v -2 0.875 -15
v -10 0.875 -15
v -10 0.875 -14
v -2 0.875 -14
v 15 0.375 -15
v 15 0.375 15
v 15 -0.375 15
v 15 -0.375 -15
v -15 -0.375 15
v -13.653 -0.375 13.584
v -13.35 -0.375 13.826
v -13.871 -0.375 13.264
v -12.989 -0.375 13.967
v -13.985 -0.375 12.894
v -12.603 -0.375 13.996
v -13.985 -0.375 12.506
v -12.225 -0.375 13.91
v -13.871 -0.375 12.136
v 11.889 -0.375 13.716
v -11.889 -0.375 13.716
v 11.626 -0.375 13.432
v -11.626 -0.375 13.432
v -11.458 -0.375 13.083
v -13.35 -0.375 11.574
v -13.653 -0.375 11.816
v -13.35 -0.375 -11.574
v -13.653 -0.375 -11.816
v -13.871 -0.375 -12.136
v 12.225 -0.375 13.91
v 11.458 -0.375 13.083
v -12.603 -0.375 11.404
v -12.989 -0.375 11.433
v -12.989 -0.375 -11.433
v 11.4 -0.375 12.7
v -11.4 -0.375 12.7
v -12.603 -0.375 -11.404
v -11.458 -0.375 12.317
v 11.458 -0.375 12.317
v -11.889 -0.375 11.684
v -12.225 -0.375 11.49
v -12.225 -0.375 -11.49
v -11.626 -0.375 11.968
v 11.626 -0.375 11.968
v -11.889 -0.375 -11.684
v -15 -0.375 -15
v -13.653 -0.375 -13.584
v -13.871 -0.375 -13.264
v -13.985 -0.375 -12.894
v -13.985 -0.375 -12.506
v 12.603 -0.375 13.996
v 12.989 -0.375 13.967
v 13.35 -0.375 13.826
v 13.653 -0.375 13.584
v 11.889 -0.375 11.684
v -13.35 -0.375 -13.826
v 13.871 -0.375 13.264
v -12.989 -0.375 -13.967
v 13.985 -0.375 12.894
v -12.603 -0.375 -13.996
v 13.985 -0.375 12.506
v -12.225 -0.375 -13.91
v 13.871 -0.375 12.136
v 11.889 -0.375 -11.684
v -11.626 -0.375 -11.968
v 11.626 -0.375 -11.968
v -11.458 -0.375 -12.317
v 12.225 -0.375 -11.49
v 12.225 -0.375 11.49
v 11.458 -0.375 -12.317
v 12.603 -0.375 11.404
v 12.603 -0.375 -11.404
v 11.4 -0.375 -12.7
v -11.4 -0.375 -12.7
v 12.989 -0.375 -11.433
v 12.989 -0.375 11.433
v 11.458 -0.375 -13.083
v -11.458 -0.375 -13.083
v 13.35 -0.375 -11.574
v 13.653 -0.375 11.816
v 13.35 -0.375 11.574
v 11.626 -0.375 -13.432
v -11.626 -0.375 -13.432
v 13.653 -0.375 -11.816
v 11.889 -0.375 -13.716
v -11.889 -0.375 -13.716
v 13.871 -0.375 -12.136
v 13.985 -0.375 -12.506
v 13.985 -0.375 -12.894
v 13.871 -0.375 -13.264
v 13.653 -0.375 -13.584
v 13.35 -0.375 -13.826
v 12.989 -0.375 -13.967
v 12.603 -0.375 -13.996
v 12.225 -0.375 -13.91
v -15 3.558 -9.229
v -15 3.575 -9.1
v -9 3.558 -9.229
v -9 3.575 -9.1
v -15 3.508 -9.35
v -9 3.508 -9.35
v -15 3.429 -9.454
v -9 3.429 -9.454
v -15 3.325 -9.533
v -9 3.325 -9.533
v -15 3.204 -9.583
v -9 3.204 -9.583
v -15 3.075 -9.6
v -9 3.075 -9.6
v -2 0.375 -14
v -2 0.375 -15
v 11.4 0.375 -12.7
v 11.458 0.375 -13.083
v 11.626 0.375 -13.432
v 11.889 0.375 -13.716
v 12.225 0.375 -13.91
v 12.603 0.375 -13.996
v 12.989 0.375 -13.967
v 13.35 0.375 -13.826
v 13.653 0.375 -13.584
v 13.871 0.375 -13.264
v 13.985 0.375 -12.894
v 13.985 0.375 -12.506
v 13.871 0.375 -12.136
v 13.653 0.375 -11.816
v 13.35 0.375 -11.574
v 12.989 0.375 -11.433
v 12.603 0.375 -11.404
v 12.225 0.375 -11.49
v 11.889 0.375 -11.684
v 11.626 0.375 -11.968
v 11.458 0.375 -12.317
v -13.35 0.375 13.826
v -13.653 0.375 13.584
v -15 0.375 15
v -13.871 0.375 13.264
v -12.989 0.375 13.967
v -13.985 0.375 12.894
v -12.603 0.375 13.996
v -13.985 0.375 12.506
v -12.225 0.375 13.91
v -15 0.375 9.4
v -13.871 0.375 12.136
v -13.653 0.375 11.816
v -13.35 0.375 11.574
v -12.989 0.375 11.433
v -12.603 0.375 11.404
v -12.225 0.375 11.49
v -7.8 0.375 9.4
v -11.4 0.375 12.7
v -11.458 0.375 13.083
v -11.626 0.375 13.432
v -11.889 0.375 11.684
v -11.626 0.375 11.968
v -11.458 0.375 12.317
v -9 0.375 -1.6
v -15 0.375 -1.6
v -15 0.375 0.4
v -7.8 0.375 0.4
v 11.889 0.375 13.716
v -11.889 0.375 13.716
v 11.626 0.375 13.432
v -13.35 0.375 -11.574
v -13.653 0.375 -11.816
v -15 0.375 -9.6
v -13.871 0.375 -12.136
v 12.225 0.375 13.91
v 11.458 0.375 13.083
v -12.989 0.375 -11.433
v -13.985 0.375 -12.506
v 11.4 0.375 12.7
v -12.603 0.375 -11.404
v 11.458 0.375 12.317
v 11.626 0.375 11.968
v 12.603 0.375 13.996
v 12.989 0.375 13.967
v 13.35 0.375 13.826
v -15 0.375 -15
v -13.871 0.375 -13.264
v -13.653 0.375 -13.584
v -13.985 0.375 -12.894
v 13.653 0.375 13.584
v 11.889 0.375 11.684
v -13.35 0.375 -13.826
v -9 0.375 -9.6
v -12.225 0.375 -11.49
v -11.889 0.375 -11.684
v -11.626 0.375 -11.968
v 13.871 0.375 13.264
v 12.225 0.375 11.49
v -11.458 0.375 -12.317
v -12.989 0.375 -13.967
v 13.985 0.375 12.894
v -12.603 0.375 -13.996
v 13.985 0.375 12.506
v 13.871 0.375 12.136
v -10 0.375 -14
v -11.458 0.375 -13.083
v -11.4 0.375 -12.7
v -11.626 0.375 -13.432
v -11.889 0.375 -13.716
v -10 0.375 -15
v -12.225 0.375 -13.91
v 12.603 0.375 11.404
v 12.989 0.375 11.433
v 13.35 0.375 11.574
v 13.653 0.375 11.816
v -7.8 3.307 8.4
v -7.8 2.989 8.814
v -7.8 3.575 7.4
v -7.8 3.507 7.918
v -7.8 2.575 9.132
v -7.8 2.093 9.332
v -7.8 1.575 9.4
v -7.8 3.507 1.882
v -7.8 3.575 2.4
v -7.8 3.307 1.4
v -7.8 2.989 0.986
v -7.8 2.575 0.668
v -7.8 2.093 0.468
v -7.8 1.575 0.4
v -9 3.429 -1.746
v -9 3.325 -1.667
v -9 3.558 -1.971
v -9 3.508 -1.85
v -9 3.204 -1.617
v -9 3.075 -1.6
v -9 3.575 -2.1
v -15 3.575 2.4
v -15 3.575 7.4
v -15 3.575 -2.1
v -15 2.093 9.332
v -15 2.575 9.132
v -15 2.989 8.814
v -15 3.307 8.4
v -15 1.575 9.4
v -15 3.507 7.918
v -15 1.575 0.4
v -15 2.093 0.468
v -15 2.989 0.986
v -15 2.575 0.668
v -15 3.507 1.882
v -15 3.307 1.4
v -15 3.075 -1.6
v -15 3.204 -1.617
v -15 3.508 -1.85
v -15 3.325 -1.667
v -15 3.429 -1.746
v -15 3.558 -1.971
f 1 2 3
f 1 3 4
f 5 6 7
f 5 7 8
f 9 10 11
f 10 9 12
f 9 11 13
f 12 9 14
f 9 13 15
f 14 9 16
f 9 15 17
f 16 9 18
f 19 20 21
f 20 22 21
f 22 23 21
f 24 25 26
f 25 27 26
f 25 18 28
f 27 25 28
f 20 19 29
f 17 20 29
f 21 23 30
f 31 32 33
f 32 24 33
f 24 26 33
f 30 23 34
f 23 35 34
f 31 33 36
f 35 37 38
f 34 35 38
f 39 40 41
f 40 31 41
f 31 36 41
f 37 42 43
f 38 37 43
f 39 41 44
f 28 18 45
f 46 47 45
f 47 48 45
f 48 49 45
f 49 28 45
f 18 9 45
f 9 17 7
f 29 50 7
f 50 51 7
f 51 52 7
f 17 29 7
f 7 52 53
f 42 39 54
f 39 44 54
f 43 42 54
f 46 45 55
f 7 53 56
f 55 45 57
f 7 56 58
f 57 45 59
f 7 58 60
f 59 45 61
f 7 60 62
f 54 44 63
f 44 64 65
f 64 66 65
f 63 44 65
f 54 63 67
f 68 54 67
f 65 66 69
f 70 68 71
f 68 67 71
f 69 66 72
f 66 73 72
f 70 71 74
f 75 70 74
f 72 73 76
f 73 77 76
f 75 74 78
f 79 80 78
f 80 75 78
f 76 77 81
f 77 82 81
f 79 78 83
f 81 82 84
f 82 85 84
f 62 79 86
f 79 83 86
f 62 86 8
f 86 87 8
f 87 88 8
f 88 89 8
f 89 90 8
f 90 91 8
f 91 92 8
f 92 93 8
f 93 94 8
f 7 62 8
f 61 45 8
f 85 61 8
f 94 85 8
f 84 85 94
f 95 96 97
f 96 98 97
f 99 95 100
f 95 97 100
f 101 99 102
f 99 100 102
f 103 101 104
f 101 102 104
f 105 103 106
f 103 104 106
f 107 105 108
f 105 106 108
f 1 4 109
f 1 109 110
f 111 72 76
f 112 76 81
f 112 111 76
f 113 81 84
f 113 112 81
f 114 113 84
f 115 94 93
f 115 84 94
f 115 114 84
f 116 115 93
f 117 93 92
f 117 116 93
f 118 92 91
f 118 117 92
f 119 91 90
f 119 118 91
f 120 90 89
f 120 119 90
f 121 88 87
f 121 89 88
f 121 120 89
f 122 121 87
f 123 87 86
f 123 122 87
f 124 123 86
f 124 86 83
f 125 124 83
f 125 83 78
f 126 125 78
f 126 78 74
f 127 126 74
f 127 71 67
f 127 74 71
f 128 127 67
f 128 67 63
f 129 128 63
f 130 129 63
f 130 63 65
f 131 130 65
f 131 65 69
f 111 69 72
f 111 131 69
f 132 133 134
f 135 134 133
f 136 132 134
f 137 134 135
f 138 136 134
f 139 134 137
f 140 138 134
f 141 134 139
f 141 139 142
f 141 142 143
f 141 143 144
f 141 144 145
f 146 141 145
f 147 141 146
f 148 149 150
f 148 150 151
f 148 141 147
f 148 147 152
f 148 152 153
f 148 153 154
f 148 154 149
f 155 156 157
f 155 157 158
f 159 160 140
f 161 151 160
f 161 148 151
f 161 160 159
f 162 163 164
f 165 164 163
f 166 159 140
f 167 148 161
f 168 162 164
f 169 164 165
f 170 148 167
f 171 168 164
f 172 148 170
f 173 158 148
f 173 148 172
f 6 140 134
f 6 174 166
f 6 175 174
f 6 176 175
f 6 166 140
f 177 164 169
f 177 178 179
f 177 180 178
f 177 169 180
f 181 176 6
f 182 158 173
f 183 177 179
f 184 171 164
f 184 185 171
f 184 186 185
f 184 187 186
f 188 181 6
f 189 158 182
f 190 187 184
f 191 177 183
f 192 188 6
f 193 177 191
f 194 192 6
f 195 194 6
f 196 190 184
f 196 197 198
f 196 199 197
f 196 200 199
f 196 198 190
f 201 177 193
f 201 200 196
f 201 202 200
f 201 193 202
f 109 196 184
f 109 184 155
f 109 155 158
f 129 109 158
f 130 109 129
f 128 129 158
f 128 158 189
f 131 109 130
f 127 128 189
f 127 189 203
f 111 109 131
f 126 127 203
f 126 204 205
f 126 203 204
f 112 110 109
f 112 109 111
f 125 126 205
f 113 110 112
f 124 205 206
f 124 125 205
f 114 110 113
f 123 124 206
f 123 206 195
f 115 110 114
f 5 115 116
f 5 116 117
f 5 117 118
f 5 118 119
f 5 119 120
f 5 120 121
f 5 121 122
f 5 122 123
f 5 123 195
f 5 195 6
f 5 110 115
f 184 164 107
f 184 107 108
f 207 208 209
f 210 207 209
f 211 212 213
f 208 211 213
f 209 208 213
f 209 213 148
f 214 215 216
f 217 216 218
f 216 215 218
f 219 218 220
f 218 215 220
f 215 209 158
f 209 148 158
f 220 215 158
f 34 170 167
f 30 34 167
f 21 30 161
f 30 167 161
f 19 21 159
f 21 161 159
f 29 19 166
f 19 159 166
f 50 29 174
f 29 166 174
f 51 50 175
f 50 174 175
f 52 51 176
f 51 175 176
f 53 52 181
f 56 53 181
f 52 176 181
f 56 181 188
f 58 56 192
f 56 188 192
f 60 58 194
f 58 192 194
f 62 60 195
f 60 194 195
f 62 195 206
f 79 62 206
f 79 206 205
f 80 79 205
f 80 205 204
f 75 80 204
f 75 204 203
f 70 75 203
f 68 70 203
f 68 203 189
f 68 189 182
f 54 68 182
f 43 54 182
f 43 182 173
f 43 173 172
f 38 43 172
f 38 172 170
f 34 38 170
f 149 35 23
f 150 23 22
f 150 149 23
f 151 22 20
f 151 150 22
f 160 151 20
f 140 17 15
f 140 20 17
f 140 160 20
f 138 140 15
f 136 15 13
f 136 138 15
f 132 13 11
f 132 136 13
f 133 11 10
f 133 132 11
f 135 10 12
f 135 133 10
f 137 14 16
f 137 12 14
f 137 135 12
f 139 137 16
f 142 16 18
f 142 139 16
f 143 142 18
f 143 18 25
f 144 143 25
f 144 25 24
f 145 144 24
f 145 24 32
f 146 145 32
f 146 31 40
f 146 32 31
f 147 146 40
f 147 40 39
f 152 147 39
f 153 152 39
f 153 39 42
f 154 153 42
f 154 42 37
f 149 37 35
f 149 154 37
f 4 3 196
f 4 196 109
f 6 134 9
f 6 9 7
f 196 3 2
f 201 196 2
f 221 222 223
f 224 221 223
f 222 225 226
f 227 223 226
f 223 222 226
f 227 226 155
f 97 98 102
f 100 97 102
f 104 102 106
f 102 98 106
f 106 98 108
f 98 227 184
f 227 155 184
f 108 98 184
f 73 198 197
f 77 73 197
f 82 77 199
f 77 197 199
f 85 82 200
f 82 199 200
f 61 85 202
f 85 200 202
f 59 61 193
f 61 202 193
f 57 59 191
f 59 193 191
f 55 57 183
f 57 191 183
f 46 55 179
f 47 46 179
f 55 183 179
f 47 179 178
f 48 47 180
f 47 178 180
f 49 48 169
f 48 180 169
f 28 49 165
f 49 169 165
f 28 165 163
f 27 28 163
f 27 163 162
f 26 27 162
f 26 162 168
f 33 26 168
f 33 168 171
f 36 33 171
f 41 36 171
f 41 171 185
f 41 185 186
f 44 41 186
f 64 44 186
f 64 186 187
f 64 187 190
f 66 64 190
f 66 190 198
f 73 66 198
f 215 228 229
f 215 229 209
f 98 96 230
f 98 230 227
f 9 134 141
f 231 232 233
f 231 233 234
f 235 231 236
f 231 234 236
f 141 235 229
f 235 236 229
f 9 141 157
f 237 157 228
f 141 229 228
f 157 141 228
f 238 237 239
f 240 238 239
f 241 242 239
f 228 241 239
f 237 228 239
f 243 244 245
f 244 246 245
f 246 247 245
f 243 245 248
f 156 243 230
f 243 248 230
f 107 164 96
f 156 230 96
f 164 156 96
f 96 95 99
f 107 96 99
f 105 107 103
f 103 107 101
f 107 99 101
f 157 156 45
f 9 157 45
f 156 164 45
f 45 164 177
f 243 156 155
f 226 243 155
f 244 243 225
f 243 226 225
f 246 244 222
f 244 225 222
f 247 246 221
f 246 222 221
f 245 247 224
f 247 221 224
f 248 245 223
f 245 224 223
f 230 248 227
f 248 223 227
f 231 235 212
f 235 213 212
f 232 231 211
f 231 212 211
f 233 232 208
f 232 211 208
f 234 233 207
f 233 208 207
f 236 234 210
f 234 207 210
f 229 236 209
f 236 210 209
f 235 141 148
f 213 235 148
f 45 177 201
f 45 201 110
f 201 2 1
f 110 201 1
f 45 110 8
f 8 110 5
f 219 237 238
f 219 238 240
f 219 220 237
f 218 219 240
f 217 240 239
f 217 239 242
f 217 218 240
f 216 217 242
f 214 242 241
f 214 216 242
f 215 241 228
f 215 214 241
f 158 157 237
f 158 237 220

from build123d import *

# Parameters (mm, degrees)
SKETCH1_W               = 30
SKETCH1_H               = 30
BOSS_EXTRUDE1_DEPTH     = 0.375
SKETCH2_R               = 1.3
CUT_EXTRUDE1_DEPTH      = 1.75
MIRROR2_COPY_1_SKETCH_R = 1.3
MIRROR2_COPY_1_DEPTH    = 1.75
SKETCH3_W               = 7.2
SKETCH3_H               = 9
SKETCH3_W_2             = 6
SKETCH3_H_2             = 8
BOSS_EXTRUDE2_DEPTH     = 3.2
FILLET1_R               = 2
FILLET2_R               = 0.5
SKETCH4_W               = 8
SKETCH4_H               = 1
BOSS_EXTRUDE3_DEPTH     = 0.5


with BuildPart() as part:
    # Sketch1 → Boss-Extrude1 (new body, symmetric)
    with BuildSketch(Plane(origin=(0, 0, 0), x_dir=(1, 0, 0), z_dir=(0, 1, 0))):
        Rectangle(SKETCH1_W, SKETCH1_H)
    extrude(amount=BOSS_EXTRUDE1_DEPTH, both=True)

    # Sketch2 → Cut-Extrude1 (cut, through all)
    with BuildSketch(Plane(origin=(0, 0.375, 0), x_dir=(1, 0, 0), z_dir=(0, 1, 0))):
        with Locations((-12.7, 12.7)):
            Circle(SKETCH2_R)
    cut_extrude1 = extrude(amount=-CUT_EXTRUDE1_DEPTH, mode=Mode.SUBTRACT)

    # Mirror1: Cut-Extrude1 across plane
    add(cut_extrude1.mirror(Plane(origin=(0, 0, 0), x_dir=(0, 0, 1), z_dir=(1, 0, 0))), mode=Mode.SUBTRACT)

    # Mirror2: Cut-Extrude1 across plane
    add(cut_extrude1.mirror(Plane.XY), mode=Mode.SUBTRACT)

    # Mirror2 copy 1 sketch → Mirror2 copy 1 (cut, through all)
    with BuildSketch(Plane(origin=(0, 0.375, 0), x_dir=(-1, 0, 0), z_dir=(0, 1, 0))):
        with Locations((-12.7, 12.7)):
            Circle(MIRROR2_COPY_1_SKETCH_R)
    extrude(amount=-MIRROR2_COPY_1_DEPTH, mode=Mode.SUBTRACT)

    # Sketch3 → Boss-Extrude2 (add)
    with BuildSketch(Plane(origin=(0, 0.375, 0), x_dir=(1, 0, 0), z_dir=(0, 1, 0))):
        with Locations((-11.4, -4.9)):
            Rectangle(SKETCH3_W, SKETCH3_H)
        with Locations((-12, 5.6)):
            Rectangle(SKETCH3_W_2, SKETCH3_H_2)
    extrude(amount=BOSS_EXTRUDE2_DEPTH)

    # Fillet1
    fillet1_edges = [part.edges().sort_by_distance(p)[0] for p in [
        (-11.4, 3.575, 9.4),
        (-11.4, 3.575, 0.4),
    ]]
    fillet(fillet1_edges, radius=FILLET1_R)

    # Fillet2
    fillet2_edges = [part.edges().sort_by_distance(p)[0] for p in [
        (-12, 3.575, -1.6),
        (-12, 3.575, -9.6),
    ]]
    fillet(fillet2_edges, radius=FILLET2_R)

    # Sketch4 → Boss-Extrude3 (add, symmetric)
    with BuildSketch(Plane(origin=(0, 0.375, 0), x_dir=(1, 0, 0), z_dir=(0, 1, 0))):
        with Locations((-6, 14.5)):
            Rectangle(SKETCH4_W, SKETCH4_H)
    extrude(amount=BOSS_EXTRUDE3_DEPTH, both=True)


solid = part.part
